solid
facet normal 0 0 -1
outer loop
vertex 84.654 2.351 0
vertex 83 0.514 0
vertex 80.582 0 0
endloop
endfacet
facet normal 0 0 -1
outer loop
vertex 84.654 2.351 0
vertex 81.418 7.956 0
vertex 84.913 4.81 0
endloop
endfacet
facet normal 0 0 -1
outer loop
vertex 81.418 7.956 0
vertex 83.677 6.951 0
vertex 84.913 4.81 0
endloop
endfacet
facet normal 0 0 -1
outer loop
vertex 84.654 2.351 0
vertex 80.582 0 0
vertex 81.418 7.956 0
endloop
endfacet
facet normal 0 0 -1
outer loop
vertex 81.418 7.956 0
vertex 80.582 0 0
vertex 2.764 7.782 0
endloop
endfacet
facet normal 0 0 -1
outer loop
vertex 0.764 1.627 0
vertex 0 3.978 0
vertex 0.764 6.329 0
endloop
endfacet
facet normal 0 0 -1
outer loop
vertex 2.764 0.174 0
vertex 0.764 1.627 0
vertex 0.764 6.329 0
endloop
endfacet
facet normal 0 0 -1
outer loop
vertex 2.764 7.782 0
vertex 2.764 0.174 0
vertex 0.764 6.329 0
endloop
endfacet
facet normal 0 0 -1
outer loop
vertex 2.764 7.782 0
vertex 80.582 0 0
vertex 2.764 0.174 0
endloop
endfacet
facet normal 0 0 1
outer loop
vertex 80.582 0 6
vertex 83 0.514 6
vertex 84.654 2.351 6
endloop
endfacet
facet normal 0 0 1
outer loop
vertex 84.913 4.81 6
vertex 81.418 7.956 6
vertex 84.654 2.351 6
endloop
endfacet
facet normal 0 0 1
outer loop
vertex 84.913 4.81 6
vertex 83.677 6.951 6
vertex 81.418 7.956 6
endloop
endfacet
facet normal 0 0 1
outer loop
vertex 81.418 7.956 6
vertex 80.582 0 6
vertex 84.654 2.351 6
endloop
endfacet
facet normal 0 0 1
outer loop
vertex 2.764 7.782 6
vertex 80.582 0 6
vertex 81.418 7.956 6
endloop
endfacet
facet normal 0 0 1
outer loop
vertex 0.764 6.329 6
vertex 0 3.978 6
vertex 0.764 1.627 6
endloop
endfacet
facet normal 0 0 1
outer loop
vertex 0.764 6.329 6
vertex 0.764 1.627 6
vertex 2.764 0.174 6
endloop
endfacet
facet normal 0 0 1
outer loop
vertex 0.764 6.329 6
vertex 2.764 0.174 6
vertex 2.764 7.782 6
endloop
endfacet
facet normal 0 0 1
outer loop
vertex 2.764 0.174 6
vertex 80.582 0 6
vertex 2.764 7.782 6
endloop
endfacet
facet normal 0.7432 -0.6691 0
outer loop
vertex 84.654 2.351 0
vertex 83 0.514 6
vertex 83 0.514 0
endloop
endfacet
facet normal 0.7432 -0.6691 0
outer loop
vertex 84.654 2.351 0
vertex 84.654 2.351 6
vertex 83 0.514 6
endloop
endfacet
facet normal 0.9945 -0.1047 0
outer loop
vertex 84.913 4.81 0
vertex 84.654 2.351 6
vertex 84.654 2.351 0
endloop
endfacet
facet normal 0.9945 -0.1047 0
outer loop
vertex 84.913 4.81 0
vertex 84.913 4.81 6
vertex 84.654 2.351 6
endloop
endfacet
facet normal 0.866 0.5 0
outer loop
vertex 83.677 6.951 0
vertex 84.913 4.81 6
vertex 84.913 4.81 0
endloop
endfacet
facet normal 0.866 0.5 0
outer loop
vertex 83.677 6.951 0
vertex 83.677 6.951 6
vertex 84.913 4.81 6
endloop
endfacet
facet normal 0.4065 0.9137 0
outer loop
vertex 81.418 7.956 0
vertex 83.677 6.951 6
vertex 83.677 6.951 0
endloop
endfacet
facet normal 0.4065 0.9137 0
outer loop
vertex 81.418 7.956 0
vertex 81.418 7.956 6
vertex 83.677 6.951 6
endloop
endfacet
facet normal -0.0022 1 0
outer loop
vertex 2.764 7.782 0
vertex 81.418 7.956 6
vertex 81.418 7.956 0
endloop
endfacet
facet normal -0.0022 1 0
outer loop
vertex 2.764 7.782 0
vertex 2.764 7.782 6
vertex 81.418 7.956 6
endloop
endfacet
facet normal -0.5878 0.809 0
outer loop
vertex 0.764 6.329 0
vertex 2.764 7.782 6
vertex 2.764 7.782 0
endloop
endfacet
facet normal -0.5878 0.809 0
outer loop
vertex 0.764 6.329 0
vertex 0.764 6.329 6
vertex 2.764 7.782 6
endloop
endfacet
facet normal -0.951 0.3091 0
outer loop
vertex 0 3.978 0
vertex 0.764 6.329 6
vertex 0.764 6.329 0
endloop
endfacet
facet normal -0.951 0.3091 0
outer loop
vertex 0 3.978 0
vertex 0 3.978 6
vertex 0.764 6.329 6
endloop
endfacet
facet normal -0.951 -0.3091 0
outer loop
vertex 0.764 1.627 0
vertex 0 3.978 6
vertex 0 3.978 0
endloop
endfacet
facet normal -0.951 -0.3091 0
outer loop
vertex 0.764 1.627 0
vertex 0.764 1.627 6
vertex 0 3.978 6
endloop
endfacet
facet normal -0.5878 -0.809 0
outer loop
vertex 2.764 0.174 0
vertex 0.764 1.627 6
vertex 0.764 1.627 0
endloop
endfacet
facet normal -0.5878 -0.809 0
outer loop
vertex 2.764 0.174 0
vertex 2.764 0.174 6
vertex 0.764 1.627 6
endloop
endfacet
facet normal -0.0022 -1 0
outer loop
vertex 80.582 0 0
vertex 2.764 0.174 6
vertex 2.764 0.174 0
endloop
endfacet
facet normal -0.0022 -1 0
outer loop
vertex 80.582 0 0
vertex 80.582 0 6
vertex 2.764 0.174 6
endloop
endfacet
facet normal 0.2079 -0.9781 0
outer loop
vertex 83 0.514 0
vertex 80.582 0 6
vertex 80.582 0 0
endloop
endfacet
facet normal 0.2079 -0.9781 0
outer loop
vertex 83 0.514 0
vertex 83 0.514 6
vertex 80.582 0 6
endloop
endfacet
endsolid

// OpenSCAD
$fn = 32;

// ----------------------------------------------------------------------
// Key bar: parallel key, 6 mm thick
// ----------------------------------------------------------------------

// --- parameters (mm) ---
profile_height = 6;       // extrusion height
profile_points = 11;      // points of the closed outline

profile = [[0, 3.978], [0.764, 1.627], [2.764, 0.174], [80.582, 0], [83, 0.514], [84.654, 2.351], [84.913, 4.81], [83.677, 6.951], [81.418, 7.956], [2.764, 7.782], [0.764, 6.329]];  // single closed polygon, 11 points, counter clockwise

// --- the one profile operation ---
linear_extrude(height = profile_height) polygon(points = profile);
